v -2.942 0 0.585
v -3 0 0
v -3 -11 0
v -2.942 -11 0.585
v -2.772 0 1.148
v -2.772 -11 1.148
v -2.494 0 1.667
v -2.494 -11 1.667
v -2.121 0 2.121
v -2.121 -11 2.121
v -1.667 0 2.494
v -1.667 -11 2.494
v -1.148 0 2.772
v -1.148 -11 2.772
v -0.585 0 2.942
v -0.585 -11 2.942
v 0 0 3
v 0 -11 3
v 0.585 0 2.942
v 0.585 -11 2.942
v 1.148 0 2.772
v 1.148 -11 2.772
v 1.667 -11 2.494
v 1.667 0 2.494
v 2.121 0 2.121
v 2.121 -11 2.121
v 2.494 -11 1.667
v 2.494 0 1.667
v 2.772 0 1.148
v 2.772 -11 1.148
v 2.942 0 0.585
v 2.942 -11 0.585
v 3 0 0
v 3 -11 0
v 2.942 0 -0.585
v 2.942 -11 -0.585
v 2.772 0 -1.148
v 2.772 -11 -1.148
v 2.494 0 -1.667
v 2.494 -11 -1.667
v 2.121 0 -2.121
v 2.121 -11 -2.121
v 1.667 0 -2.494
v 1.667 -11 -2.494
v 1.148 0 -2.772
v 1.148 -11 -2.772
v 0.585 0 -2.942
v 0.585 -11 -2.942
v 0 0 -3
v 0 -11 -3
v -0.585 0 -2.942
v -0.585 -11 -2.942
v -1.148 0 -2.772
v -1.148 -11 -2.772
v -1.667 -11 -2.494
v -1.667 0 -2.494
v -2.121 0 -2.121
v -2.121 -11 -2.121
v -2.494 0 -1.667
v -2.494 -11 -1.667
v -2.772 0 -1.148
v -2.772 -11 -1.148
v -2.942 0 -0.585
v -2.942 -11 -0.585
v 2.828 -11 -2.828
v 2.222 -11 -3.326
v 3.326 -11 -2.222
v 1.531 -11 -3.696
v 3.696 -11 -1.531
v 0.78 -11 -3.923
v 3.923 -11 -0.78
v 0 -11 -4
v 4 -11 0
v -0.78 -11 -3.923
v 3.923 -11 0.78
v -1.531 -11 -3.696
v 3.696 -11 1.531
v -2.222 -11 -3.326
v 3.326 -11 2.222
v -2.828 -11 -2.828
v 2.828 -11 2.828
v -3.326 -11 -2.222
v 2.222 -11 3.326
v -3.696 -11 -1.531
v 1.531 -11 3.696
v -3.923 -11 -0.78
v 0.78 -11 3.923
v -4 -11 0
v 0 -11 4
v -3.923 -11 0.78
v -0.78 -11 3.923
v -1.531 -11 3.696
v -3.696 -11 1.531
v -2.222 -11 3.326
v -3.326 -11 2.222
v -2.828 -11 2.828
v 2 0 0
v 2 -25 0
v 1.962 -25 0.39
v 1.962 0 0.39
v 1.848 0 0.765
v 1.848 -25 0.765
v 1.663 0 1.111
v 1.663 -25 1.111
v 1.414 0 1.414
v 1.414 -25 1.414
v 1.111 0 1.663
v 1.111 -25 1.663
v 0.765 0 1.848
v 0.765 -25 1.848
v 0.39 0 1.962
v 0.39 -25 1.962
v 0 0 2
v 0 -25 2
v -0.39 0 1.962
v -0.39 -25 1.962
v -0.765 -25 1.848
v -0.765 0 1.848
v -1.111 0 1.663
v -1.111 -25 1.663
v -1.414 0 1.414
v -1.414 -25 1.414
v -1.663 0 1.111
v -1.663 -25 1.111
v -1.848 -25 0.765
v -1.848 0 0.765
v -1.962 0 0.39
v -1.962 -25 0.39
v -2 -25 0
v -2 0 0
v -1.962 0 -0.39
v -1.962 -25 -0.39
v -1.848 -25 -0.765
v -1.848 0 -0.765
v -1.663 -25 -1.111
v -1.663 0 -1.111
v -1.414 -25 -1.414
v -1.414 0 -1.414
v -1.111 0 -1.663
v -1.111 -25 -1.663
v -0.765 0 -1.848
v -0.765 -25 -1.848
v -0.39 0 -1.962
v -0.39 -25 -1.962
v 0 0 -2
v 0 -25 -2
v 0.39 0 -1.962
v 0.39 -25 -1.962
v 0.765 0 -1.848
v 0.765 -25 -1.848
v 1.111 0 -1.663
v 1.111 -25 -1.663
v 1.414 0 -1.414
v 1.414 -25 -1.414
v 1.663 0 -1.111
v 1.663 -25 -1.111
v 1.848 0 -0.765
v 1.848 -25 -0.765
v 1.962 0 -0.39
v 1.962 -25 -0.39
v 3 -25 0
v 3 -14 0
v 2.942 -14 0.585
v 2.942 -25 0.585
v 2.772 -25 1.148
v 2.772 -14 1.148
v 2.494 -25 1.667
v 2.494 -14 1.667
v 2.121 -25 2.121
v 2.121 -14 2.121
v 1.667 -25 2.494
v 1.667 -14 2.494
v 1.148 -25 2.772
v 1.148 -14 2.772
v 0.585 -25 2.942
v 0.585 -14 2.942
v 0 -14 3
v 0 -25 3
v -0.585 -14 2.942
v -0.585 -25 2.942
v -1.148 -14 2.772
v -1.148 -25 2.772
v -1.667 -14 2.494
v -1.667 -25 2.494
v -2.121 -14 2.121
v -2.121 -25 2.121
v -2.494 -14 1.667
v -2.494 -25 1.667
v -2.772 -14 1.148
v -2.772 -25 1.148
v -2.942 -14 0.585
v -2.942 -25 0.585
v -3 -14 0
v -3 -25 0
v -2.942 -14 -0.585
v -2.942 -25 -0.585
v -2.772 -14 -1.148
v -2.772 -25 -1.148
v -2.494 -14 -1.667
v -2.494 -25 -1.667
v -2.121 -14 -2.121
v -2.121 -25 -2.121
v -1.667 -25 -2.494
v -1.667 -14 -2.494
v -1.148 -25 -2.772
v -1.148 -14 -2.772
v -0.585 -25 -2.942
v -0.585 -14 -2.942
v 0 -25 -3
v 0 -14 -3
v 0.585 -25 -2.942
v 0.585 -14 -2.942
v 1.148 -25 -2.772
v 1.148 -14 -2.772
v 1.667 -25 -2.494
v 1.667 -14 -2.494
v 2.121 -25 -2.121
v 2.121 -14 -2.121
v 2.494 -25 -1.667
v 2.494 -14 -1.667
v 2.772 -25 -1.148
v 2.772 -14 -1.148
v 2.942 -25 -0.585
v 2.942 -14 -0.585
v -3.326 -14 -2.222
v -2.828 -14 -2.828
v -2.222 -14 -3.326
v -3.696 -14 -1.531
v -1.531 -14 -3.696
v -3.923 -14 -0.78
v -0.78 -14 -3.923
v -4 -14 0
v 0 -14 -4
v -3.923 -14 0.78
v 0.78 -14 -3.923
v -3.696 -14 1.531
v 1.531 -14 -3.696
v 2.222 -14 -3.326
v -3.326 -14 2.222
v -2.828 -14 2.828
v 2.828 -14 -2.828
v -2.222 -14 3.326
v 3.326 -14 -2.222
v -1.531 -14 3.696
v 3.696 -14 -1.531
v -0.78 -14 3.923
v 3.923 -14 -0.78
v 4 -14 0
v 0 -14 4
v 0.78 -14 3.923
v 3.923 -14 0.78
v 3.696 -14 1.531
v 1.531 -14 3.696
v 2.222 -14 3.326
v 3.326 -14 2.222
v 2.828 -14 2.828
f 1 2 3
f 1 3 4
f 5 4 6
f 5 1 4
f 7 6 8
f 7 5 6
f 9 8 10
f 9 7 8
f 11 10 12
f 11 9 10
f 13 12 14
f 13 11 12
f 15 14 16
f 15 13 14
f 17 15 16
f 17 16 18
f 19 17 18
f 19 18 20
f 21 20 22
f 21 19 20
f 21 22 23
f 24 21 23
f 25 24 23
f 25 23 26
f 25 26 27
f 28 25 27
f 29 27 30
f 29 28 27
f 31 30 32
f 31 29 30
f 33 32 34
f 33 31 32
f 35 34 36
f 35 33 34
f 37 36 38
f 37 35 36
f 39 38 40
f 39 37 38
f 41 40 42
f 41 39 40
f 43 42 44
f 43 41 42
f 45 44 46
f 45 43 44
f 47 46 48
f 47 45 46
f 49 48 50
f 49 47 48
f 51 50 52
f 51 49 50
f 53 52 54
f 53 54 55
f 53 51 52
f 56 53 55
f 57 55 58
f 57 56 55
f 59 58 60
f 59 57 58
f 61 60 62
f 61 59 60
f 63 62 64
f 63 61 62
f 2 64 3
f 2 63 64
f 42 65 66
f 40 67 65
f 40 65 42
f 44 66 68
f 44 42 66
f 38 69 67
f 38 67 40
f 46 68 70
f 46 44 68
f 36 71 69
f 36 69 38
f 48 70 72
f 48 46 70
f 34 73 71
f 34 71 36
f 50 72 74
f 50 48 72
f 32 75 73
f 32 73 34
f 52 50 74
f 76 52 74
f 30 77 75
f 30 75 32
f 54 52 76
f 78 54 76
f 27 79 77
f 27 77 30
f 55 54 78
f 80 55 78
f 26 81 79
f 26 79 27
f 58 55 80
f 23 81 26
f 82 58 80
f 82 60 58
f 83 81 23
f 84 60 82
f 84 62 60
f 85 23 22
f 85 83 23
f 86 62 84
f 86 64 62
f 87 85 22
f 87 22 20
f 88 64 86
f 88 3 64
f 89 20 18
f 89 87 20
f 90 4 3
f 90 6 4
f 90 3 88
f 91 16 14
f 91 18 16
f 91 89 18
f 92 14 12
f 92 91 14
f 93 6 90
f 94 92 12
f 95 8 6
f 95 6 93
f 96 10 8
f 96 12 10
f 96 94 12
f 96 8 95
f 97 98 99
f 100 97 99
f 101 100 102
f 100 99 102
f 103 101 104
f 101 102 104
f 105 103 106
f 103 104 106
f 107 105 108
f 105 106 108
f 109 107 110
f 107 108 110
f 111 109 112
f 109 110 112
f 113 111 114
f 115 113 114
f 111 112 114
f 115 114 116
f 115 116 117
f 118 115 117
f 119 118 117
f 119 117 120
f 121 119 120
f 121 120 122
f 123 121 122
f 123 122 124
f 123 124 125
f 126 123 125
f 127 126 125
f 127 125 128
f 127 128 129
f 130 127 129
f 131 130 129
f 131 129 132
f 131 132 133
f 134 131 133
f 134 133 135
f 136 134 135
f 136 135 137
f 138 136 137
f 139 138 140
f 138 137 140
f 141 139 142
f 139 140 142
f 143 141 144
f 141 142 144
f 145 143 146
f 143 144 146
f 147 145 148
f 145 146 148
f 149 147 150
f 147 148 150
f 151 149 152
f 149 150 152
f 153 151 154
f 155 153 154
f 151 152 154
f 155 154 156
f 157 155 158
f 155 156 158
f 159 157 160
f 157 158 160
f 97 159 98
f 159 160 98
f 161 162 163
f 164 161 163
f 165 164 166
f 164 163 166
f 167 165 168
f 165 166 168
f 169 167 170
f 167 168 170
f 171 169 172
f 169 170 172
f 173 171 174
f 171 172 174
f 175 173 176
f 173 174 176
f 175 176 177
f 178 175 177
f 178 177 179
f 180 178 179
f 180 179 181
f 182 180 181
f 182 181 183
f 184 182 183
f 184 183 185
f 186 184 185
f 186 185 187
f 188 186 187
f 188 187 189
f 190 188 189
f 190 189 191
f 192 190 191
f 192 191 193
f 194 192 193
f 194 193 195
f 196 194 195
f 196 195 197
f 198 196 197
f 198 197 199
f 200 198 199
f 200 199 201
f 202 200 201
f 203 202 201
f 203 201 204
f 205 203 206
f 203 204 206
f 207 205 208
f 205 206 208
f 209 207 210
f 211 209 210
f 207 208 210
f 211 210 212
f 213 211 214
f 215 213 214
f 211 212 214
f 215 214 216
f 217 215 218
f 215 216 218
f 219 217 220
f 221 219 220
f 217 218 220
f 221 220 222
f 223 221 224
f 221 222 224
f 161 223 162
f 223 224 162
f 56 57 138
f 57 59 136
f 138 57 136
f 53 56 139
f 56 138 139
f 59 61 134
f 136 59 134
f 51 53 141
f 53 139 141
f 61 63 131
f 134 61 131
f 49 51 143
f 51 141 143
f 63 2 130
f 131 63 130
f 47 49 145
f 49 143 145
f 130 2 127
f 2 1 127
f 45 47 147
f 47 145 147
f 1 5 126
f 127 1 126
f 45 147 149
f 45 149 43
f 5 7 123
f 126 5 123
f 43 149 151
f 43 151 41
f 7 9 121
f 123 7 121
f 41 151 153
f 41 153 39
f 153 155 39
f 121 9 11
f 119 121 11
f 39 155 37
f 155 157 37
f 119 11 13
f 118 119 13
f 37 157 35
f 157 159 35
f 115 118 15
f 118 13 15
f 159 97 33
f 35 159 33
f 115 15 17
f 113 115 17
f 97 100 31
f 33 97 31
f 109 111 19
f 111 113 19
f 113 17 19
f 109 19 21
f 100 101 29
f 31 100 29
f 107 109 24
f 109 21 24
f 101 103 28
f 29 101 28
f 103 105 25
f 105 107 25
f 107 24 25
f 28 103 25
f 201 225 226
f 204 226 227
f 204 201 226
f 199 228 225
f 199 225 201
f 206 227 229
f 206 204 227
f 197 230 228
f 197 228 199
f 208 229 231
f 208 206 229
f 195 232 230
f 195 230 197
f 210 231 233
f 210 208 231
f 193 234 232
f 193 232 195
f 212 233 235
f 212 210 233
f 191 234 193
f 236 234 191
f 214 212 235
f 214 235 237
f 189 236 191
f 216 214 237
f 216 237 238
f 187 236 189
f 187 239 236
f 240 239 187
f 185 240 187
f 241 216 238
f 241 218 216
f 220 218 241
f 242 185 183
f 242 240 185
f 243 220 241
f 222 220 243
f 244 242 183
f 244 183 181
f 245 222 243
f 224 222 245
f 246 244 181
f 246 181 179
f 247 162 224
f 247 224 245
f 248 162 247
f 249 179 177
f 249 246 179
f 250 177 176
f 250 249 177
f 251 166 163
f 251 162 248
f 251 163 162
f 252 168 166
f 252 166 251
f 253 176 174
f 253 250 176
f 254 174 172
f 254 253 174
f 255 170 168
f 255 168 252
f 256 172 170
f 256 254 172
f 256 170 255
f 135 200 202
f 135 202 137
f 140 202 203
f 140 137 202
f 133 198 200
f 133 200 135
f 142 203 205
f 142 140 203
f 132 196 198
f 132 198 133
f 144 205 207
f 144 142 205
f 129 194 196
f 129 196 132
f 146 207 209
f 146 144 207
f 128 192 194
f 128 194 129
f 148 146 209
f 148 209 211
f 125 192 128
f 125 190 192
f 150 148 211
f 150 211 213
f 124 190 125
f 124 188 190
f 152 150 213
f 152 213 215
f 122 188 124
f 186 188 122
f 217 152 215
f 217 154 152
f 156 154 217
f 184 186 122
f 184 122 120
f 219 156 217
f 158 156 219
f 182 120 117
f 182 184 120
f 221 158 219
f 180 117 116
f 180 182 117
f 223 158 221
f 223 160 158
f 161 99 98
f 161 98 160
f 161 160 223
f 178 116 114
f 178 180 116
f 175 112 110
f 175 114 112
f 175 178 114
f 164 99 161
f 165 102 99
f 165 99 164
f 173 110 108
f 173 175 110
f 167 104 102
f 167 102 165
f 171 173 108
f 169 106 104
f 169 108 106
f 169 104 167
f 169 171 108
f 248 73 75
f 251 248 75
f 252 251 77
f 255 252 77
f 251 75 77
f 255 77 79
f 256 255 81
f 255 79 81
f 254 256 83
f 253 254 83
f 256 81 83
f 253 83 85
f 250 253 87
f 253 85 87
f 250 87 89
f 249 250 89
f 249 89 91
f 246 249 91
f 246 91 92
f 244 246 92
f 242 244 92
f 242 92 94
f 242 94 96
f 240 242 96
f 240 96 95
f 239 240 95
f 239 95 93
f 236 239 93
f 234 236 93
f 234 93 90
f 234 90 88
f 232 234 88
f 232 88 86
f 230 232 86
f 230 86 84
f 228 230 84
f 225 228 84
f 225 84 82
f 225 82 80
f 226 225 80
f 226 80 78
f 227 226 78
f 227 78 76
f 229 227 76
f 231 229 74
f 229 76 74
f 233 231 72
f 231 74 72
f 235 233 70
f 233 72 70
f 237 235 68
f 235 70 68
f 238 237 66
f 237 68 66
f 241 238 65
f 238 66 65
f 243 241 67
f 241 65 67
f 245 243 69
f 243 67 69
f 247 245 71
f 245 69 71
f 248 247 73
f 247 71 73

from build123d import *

# Parameters (mm, degrees)
F1_R     = 3
F2_DEPTH = 25
F0_R     = 4
F3_DEPTH = 14
F4_R     = 4
F4_R_2   = 3
F5_DEPTH = 11
F7_D     = 4


with BuildPart() as f2:
    # F1 (on Front) → F2 (new body)
    with BuildSketch(Plane.XZ):
        Circle(F1_R)
    extrude(amount=F2_DEPTH)

    # F0 (on Front) → F3 (join)
    with BuildSketch(Plane.XZ):
        Circle(F0_R)
    extrude(amount=F3_DEPTH)

    # F4 (on face) → F5 (cut)
    with BuildSketch(Plane(origin=(0, 0, 0), x_dir=(-1, 0, 0), z_dir=(0, 1, 0))):
        Circle(F4_R)
        Circle(F4_R_2, mode=Mode.SUBTRACT)
    extrude(amount=-F5_DEPTH, mode=Mode.SUBTRACT)

    # F7 (through all)
    with Locations(Plane(origin=(0, 0, 0), x_dir=(-1, 0, 0), z_dir=(0, 1, 0))):
        with Locations((0, 0)):
            Hole(F7_D / 2)


solid = f2.part
